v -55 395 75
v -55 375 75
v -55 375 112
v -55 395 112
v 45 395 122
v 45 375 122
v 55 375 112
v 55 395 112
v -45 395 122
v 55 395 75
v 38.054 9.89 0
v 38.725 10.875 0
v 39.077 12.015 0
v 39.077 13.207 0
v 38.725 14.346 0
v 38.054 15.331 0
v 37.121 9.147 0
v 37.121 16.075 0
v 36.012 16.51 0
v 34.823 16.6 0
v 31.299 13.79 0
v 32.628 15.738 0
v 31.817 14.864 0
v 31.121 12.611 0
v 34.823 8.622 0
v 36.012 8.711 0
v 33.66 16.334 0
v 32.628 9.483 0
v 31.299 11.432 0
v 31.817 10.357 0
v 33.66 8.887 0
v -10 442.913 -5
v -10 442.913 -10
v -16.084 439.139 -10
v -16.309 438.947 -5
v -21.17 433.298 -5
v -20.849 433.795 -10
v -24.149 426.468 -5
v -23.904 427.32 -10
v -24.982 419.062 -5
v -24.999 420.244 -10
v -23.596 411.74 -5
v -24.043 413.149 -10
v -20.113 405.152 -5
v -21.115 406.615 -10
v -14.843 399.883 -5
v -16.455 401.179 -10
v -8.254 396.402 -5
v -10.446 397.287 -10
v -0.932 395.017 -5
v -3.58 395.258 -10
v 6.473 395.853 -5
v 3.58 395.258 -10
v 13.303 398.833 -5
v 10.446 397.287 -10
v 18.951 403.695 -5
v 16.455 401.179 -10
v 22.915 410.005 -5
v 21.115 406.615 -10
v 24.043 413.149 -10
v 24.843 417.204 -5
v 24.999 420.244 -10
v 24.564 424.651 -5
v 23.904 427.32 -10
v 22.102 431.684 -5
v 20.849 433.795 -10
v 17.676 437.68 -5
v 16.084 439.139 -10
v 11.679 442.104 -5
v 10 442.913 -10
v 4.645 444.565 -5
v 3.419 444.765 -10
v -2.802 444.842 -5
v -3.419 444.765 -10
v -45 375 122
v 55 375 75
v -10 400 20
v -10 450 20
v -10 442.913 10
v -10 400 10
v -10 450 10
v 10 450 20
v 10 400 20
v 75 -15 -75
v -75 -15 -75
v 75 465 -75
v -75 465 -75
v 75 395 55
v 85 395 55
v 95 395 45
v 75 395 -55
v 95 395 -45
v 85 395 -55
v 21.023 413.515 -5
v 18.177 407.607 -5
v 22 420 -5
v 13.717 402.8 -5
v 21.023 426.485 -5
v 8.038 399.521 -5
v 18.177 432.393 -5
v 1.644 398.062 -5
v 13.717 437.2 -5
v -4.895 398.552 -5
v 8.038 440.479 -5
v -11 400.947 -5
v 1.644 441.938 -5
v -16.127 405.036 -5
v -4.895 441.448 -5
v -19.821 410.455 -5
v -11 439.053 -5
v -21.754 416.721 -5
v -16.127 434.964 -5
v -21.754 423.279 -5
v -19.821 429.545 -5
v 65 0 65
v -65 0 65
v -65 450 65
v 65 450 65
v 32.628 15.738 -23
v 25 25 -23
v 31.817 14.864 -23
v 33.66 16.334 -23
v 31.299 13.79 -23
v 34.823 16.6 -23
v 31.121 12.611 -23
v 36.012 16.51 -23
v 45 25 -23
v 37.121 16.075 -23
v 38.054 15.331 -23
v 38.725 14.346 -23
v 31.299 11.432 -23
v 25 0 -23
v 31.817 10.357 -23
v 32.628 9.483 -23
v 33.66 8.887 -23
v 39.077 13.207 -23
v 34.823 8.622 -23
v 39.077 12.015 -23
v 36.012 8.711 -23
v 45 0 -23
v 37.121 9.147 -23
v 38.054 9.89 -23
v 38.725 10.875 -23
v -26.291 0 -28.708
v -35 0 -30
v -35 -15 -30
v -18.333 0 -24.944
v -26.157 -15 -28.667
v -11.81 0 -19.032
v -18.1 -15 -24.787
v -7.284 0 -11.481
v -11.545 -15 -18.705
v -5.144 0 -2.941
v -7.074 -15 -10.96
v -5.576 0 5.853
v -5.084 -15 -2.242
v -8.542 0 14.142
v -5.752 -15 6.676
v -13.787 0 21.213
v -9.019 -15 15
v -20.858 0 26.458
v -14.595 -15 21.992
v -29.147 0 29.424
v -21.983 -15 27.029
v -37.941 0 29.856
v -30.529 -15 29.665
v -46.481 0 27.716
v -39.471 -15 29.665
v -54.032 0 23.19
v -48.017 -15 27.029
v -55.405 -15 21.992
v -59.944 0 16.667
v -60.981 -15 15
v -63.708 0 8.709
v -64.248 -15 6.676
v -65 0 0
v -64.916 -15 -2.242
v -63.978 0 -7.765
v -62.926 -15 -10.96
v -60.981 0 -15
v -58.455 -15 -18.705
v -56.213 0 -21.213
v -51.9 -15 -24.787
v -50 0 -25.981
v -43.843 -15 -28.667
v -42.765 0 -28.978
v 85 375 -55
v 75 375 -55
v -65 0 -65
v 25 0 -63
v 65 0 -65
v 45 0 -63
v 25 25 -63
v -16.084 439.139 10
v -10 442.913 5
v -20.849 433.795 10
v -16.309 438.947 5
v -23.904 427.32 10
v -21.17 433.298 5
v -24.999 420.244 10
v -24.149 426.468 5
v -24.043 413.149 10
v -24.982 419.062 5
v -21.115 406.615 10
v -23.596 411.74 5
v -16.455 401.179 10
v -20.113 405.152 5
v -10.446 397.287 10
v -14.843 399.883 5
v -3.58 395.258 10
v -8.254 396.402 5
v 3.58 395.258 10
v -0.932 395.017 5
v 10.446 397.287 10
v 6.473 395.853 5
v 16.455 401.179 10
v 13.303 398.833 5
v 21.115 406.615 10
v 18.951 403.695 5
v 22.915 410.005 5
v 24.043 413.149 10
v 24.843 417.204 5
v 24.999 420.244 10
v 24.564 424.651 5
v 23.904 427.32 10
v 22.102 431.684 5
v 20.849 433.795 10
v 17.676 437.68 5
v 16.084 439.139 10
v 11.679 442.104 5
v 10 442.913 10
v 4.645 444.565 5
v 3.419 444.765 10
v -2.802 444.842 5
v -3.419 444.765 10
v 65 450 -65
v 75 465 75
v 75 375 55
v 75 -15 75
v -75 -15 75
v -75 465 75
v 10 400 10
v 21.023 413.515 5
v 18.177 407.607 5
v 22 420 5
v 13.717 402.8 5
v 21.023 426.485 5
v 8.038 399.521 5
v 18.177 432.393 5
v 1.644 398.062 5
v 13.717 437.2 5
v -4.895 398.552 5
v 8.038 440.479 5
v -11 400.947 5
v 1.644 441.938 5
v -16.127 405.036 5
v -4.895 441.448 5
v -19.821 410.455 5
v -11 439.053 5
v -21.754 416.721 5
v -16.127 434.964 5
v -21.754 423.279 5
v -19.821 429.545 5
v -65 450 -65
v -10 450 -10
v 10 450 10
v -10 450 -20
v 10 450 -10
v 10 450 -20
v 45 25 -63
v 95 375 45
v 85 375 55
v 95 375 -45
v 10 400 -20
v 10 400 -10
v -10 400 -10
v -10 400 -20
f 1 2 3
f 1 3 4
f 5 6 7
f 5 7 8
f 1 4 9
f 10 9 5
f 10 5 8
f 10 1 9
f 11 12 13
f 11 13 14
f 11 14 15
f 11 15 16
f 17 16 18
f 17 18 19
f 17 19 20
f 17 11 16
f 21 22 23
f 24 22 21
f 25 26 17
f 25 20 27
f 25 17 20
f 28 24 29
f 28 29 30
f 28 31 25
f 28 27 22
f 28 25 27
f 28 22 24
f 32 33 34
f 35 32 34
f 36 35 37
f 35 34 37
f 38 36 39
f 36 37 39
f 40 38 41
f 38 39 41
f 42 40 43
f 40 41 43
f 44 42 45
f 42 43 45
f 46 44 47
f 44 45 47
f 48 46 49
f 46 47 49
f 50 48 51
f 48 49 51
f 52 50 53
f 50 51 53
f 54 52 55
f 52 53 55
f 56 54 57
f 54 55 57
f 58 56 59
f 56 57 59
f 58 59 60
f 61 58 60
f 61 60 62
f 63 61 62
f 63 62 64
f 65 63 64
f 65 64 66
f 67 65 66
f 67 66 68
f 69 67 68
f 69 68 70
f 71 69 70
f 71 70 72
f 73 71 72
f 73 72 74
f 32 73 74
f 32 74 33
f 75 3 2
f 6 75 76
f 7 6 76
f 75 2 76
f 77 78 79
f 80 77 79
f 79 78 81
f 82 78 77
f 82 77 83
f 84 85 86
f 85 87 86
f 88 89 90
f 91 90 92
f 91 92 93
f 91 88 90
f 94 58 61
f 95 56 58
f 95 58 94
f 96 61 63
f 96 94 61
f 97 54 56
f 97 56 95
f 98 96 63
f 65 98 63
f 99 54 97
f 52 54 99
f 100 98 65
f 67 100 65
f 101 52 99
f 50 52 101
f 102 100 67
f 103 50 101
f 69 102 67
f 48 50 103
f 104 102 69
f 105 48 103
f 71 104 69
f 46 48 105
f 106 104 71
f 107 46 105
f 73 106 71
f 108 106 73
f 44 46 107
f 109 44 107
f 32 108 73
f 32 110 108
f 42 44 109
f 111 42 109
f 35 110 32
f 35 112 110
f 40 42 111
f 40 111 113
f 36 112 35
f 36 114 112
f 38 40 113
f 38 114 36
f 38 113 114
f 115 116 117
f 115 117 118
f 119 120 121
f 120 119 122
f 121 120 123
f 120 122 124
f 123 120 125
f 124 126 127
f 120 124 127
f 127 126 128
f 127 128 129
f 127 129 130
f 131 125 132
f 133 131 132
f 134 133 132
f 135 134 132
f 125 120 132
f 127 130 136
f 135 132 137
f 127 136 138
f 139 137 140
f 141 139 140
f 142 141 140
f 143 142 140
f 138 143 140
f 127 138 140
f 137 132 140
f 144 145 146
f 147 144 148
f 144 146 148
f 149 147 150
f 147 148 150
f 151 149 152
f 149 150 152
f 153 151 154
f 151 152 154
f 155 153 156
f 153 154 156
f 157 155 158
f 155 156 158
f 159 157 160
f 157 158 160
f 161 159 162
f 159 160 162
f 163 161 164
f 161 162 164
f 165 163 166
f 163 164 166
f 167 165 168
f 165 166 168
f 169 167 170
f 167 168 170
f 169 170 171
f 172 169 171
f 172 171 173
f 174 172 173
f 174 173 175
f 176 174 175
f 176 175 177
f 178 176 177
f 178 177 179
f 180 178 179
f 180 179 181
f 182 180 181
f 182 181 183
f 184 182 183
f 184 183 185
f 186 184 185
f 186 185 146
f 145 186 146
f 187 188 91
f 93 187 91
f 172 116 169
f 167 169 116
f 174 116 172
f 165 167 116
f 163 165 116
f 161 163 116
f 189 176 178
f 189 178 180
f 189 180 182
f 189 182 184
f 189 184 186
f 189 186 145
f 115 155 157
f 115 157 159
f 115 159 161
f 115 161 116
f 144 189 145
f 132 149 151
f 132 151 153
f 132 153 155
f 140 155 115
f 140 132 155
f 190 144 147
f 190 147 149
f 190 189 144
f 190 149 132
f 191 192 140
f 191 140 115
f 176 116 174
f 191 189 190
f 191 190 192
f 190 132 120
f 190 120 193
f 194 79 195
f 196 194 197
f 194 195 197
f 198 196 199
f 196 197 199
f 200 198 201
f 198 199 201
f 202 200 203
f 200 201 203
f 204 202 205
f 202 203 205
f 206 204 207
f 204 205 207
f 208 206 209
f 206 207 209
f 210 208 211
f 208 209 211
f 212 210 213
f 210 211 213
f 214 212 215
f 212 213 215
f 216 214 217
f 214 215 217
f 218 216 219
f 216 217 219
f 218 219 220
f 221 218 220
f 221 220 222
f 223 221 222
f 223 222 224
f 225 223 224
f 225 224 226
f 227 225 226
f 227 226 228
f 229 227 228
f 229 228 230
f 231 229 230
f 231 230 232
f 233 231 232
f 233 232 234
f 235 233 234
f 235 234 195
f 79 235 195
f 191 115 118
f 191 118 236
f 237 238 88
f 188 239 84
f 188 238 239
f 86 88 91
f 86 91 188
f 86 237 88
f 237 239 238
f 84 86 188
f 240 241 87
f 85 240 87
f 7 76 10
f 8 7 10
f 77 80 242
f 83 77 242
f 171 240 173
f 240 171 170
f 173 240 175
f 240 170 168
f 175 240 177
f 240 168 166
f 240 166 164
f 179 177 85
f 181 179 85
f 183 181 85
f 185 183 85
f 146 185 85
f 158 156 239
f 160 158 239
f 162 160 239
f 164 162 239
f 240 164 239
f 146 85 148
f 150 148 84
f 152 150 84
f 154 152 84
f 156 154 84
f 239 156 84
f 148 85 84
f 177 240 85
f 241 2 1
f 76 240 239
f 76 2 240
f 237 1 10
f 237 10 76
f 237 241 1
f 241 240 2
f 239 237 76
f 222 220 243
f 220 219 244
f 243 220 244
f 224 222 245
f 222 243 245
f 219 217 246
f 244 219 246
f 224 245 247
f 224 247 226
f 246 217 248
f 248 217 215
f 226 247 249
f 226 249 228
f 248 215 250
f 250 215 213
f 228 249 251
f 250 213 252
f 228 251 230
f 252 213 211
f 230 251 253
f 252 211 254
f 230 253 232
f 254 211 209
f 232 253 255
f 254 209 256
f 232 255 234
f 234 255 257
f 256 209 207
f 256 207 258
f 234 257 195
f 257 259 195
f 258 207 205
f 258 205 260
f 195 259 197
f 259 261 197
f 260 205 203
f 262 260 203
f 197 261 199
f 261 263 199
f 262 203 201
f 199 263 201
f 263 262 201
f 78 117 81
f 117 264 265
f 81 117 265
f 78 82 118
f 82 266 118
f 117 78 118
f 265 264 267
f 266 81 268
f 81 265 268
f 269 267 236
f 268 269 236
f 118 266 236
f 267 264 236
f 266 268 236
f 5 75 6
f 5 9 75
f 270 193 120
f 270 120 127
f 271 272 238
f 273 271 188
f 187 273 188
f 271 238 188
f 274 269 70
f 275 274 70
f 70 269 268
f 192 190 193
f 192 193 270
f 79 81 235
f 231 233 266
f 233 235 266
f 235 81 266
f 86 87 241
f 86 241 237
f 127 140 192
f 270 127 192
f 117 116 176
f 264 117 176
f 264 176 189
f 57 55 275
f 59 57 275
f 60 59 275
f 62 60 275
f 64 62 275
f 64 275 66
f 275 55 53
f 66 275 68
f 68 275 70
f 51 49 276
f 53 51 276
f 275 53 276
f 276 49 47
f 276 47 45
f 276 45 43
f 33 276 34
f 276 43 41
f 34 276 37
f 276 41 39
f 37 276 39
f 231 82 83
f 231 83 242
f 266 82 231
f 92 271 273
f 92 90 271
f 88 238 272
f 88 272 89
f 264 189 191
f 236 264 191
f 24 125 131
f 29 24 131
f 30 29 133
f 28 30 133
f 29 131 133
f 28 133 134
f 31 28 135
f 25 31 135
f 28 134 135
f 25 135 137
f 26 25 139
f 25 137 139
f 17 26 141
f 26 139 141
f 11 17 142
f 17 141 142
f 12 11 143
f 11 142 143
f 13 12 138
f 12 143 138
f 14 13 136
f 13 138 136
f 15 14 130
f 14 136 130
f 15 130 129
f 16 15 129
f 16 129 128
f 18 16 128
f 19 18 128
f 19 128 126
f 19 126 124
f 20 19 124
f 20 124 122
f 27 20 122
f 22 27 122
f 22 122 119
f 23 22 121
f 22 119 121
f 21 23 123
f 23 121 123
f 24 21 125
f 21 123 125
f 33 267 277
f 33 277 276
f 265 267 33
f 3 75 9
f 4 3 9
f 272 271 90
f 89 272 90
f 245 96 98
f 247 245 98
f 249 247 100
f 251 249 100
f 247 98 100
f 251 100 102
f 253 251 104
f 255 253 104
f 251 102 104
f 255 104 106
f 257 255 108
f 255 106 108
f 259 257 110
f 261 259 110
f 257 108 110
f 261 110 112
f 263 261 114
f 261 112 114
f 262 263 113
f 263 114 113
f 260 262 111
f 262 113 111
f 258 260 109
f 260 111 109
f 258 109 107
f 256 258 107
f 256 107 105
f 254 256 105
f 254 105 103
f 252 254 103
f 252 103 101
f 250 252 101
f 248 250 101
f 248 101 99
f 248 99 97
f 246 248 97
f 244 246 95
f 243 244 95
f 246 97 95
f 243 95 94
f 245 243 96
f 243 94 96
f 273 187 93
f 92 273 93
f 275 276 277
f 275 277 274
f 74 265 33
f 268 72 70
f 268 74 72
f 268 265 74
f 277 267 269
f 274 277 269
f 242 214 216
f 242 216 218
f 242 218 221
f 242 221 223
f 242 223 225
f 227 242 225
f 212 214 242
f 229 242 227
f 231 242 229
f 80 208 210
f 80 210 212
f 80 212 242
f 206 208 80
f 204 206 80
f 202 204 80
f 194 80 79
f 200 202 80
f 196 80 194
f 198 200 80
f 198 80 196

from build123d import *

# Parameters (mm, degrees)
SKETCH2_W            = 150
SKETCH2_H            = 150
SKETCH2_W_2          = 130
SKETCH2_H_2          = 130
BOSS_EXTRUDE2_DEPTH  = 450
SKETCH4_W            = 150
SKETCH4_H            = 150
BOSS_EXTRUDE3_DEPTH  = 15
BOSS_EXTRUDE4_START  = -450
SKETCH4_2_W          = 150
SKETCH4_2_H          = 150
BOSS_EXTRUDE4_DEPTH  = 15
SKETCH5_R            = 30
CUT_EXTRUDE1_DEPTH   = 15
SKETCH7_W            = 20
SKETCH7_H            = 10
BOSS_EXTRUDE5_DEPTH  = 50
BOSS_EXTRUDE6_START  = -10
SKETCH9_R            = 25
BOSS_EXTRUDE6_DEPTH  = 20
CUT_EXTRUDE3_START   = 5
SKETCH10_R           = 25
SKETCH10_R_2         = 22
CUT_EXTRUDE3_DEPTH   = 10
SKETCH12_W           = 20
SKETCH12_H           = 40
BOSS_EXTRUDE7_DEPTH  = 25
SKETCH13_R           = 4
BOSS_EXTRUDE8_DEPTH  = 23
SKETCH18_W           = 110
SKETCH18_H           = 20
BOSS_EXTRUDE11_DEPTH = 20
CHAMFER1_SIZE        = 10
CHAMFER2_SIZE        = 10
SKETCH19_W           = 110
SKETCH19_H           = 20
BOSS_EXTRUDE12_DEPTH = 47
CHAMFER3_SIZE        = 10


with BuildPart() as part:
    # Sketch2 → Boss-Extrude2 (new body)
    with BuildSketch(Plane(origin=(0, 0, 0), x_dir=(1, 0, 0), z_dir=(0, 1, 0))):
        Rectangle(SKETCH2_W, SKETCH2_H)
        Rectangle(SKETCH2_W_2, SKETCH2_H_2, mode=Mode.SUBTRACT)
    extrude(amount=BOSS_EXTRUDE2_DEPTH)

    # Sketch4 → Boss-Extrude3 (add)
    with BuildSketch(Plane(origin=(0, 450, 0), x_dir=(1, 0, 0), z_dir=(0, 1, 0))):
        Rectangle(SKETCH4_W, SKETCH4_H)
    extrude(amount=BOSS_EXTRUDE3_DEPTH)

    # Sketch4<2> → Boss-Extrude4 (add)
    with BuildSketch(Plane(origin=(0, 450, 0), x_dir=(1, 0, 0), z_dir=(0, 1, 0)).offset(BOSS_EXTRUDE4_START)):
        Rectangle(SKETCH4_2_W, SKETCH4_2_H)
    extrude(amount=-BOSS_EXTRUDE4_DEPTH)

    # Sketch5 → Cut-Extrude1 (cut)
    with BuildSketch(Plane.XZ.offset(15)):
        with Locations((-35, 0)):
            Circle(SKETCH5_R)
    extrude(amount=-CUT_EXTRUDE1_DEPTH, mode=Mode.SUBTRACT)

    # Sketch7 → Boss-Extrude5 (add)
    with BuildSketch(Plane.XZ.offset(-450)):
        with Locations((0, -15)):
            Rectangle(SKETCH7_W, SKETCH7_H)
    boss_extrude5 = extrude(amount=BOSS_EXTRUDE5_DEPTH)

    # Mirror1: Boss-Extrude5 across plane
    add(boss_extrude5.mirror(Plane.XY))

    # Sketch9 → Boss-Extrude6 (add)
    with BuildSketch(Plane.XY.offset(BOSS_EXTRUDE6_START)):
        with Locations((0, 420)):
            Circle(SKETCH9_R)
    extrude(amount=BOSS_EXTRUDE6_DEPTH)

    # Sketch10 → Cut-Extrude3 (cut)
    with BuildSketch(Plane.XY.offset(-10).offset(CUT_EXTRUDE3_START)):
        with Locations((0, 420)):
            Circle(SKETCH10_R)
        with Locations((0, 420)):
            Circle(SKETCH10_R_2, mode=Mode.SUBTRACT)
    extrude(amount=CUT_EXTRUDE3_DEPTH, mode=Mode.SUBTRACT)

    # Sketch12 → Boss-Extrude7 (add)
    with BuildSketch(Plane(origin=(0, 0, 0), x_dir=(1, 0, 0), z_dir=(0, 1, 0))):
        with Locations((35, 43)):
            Rectangle(SKETCH12_W, SKETCH12_H)
    extrude(amount=BOSS_EXTRUDE7_DEPTH)

    # Sketch13 → Boss-Extrude8 (add)
    with BuildSketch(Plane.XY.offset(-23)):
        with Locations((35.121485498, 12.610702381)):
            Circle(SKETCH13_R)
    extrude(amount=BOSS_EXTRUDE8_DEPTH)

    # Sketch18 → Boss-Extrude11 (add)
    with BuildSketch(Plane(origin=(75, 0, 0), x_dir=(0, 0, -1), z_dir=(1, 0, 0))):
        with Locations((0, 385)):
            Rectangle(SKETCH18_W, SKETCH18_H)
    extrude(amount=BOSS_EXTRUDE11_DEPTH)

    # Chamfer1
    chamfer1_edges = [part.edges().sort_by_distance(p)[0] for p in [
        (95, 385, 55),
    ]]
    chamfer(chamfer1_edges, length=CHAMFER1_SIZE)

    # Chamfer2
    chamfer2_edges = [part.edges().sort_by_distance(p)[0] for p in [
        (95, 385, -55),
    ]]
    chamfer(chamfer2_edges, length=CHAMFER2_SIZE)

    # Sketch19 → Boss-Extrude12 (add)
    with BuildSketch(Plane.XY.offset(75)):
        with Locations((0, 385)):
            Rectangle(SKETCH19_W, SKETCH19_H)
    extrude(amount=BOSS_EXTRUDE12_DEPTH)

    # Chamfer3
    chamfer3_edges = [part.edges().sort_by_distance(p)[0] for p in [
        (-55, 385, 122),
        (55, 385, 122),
    ]]
    chamfer(chamfer3_edges, length=CHAMFER3_SIZE)


solid = part.part
